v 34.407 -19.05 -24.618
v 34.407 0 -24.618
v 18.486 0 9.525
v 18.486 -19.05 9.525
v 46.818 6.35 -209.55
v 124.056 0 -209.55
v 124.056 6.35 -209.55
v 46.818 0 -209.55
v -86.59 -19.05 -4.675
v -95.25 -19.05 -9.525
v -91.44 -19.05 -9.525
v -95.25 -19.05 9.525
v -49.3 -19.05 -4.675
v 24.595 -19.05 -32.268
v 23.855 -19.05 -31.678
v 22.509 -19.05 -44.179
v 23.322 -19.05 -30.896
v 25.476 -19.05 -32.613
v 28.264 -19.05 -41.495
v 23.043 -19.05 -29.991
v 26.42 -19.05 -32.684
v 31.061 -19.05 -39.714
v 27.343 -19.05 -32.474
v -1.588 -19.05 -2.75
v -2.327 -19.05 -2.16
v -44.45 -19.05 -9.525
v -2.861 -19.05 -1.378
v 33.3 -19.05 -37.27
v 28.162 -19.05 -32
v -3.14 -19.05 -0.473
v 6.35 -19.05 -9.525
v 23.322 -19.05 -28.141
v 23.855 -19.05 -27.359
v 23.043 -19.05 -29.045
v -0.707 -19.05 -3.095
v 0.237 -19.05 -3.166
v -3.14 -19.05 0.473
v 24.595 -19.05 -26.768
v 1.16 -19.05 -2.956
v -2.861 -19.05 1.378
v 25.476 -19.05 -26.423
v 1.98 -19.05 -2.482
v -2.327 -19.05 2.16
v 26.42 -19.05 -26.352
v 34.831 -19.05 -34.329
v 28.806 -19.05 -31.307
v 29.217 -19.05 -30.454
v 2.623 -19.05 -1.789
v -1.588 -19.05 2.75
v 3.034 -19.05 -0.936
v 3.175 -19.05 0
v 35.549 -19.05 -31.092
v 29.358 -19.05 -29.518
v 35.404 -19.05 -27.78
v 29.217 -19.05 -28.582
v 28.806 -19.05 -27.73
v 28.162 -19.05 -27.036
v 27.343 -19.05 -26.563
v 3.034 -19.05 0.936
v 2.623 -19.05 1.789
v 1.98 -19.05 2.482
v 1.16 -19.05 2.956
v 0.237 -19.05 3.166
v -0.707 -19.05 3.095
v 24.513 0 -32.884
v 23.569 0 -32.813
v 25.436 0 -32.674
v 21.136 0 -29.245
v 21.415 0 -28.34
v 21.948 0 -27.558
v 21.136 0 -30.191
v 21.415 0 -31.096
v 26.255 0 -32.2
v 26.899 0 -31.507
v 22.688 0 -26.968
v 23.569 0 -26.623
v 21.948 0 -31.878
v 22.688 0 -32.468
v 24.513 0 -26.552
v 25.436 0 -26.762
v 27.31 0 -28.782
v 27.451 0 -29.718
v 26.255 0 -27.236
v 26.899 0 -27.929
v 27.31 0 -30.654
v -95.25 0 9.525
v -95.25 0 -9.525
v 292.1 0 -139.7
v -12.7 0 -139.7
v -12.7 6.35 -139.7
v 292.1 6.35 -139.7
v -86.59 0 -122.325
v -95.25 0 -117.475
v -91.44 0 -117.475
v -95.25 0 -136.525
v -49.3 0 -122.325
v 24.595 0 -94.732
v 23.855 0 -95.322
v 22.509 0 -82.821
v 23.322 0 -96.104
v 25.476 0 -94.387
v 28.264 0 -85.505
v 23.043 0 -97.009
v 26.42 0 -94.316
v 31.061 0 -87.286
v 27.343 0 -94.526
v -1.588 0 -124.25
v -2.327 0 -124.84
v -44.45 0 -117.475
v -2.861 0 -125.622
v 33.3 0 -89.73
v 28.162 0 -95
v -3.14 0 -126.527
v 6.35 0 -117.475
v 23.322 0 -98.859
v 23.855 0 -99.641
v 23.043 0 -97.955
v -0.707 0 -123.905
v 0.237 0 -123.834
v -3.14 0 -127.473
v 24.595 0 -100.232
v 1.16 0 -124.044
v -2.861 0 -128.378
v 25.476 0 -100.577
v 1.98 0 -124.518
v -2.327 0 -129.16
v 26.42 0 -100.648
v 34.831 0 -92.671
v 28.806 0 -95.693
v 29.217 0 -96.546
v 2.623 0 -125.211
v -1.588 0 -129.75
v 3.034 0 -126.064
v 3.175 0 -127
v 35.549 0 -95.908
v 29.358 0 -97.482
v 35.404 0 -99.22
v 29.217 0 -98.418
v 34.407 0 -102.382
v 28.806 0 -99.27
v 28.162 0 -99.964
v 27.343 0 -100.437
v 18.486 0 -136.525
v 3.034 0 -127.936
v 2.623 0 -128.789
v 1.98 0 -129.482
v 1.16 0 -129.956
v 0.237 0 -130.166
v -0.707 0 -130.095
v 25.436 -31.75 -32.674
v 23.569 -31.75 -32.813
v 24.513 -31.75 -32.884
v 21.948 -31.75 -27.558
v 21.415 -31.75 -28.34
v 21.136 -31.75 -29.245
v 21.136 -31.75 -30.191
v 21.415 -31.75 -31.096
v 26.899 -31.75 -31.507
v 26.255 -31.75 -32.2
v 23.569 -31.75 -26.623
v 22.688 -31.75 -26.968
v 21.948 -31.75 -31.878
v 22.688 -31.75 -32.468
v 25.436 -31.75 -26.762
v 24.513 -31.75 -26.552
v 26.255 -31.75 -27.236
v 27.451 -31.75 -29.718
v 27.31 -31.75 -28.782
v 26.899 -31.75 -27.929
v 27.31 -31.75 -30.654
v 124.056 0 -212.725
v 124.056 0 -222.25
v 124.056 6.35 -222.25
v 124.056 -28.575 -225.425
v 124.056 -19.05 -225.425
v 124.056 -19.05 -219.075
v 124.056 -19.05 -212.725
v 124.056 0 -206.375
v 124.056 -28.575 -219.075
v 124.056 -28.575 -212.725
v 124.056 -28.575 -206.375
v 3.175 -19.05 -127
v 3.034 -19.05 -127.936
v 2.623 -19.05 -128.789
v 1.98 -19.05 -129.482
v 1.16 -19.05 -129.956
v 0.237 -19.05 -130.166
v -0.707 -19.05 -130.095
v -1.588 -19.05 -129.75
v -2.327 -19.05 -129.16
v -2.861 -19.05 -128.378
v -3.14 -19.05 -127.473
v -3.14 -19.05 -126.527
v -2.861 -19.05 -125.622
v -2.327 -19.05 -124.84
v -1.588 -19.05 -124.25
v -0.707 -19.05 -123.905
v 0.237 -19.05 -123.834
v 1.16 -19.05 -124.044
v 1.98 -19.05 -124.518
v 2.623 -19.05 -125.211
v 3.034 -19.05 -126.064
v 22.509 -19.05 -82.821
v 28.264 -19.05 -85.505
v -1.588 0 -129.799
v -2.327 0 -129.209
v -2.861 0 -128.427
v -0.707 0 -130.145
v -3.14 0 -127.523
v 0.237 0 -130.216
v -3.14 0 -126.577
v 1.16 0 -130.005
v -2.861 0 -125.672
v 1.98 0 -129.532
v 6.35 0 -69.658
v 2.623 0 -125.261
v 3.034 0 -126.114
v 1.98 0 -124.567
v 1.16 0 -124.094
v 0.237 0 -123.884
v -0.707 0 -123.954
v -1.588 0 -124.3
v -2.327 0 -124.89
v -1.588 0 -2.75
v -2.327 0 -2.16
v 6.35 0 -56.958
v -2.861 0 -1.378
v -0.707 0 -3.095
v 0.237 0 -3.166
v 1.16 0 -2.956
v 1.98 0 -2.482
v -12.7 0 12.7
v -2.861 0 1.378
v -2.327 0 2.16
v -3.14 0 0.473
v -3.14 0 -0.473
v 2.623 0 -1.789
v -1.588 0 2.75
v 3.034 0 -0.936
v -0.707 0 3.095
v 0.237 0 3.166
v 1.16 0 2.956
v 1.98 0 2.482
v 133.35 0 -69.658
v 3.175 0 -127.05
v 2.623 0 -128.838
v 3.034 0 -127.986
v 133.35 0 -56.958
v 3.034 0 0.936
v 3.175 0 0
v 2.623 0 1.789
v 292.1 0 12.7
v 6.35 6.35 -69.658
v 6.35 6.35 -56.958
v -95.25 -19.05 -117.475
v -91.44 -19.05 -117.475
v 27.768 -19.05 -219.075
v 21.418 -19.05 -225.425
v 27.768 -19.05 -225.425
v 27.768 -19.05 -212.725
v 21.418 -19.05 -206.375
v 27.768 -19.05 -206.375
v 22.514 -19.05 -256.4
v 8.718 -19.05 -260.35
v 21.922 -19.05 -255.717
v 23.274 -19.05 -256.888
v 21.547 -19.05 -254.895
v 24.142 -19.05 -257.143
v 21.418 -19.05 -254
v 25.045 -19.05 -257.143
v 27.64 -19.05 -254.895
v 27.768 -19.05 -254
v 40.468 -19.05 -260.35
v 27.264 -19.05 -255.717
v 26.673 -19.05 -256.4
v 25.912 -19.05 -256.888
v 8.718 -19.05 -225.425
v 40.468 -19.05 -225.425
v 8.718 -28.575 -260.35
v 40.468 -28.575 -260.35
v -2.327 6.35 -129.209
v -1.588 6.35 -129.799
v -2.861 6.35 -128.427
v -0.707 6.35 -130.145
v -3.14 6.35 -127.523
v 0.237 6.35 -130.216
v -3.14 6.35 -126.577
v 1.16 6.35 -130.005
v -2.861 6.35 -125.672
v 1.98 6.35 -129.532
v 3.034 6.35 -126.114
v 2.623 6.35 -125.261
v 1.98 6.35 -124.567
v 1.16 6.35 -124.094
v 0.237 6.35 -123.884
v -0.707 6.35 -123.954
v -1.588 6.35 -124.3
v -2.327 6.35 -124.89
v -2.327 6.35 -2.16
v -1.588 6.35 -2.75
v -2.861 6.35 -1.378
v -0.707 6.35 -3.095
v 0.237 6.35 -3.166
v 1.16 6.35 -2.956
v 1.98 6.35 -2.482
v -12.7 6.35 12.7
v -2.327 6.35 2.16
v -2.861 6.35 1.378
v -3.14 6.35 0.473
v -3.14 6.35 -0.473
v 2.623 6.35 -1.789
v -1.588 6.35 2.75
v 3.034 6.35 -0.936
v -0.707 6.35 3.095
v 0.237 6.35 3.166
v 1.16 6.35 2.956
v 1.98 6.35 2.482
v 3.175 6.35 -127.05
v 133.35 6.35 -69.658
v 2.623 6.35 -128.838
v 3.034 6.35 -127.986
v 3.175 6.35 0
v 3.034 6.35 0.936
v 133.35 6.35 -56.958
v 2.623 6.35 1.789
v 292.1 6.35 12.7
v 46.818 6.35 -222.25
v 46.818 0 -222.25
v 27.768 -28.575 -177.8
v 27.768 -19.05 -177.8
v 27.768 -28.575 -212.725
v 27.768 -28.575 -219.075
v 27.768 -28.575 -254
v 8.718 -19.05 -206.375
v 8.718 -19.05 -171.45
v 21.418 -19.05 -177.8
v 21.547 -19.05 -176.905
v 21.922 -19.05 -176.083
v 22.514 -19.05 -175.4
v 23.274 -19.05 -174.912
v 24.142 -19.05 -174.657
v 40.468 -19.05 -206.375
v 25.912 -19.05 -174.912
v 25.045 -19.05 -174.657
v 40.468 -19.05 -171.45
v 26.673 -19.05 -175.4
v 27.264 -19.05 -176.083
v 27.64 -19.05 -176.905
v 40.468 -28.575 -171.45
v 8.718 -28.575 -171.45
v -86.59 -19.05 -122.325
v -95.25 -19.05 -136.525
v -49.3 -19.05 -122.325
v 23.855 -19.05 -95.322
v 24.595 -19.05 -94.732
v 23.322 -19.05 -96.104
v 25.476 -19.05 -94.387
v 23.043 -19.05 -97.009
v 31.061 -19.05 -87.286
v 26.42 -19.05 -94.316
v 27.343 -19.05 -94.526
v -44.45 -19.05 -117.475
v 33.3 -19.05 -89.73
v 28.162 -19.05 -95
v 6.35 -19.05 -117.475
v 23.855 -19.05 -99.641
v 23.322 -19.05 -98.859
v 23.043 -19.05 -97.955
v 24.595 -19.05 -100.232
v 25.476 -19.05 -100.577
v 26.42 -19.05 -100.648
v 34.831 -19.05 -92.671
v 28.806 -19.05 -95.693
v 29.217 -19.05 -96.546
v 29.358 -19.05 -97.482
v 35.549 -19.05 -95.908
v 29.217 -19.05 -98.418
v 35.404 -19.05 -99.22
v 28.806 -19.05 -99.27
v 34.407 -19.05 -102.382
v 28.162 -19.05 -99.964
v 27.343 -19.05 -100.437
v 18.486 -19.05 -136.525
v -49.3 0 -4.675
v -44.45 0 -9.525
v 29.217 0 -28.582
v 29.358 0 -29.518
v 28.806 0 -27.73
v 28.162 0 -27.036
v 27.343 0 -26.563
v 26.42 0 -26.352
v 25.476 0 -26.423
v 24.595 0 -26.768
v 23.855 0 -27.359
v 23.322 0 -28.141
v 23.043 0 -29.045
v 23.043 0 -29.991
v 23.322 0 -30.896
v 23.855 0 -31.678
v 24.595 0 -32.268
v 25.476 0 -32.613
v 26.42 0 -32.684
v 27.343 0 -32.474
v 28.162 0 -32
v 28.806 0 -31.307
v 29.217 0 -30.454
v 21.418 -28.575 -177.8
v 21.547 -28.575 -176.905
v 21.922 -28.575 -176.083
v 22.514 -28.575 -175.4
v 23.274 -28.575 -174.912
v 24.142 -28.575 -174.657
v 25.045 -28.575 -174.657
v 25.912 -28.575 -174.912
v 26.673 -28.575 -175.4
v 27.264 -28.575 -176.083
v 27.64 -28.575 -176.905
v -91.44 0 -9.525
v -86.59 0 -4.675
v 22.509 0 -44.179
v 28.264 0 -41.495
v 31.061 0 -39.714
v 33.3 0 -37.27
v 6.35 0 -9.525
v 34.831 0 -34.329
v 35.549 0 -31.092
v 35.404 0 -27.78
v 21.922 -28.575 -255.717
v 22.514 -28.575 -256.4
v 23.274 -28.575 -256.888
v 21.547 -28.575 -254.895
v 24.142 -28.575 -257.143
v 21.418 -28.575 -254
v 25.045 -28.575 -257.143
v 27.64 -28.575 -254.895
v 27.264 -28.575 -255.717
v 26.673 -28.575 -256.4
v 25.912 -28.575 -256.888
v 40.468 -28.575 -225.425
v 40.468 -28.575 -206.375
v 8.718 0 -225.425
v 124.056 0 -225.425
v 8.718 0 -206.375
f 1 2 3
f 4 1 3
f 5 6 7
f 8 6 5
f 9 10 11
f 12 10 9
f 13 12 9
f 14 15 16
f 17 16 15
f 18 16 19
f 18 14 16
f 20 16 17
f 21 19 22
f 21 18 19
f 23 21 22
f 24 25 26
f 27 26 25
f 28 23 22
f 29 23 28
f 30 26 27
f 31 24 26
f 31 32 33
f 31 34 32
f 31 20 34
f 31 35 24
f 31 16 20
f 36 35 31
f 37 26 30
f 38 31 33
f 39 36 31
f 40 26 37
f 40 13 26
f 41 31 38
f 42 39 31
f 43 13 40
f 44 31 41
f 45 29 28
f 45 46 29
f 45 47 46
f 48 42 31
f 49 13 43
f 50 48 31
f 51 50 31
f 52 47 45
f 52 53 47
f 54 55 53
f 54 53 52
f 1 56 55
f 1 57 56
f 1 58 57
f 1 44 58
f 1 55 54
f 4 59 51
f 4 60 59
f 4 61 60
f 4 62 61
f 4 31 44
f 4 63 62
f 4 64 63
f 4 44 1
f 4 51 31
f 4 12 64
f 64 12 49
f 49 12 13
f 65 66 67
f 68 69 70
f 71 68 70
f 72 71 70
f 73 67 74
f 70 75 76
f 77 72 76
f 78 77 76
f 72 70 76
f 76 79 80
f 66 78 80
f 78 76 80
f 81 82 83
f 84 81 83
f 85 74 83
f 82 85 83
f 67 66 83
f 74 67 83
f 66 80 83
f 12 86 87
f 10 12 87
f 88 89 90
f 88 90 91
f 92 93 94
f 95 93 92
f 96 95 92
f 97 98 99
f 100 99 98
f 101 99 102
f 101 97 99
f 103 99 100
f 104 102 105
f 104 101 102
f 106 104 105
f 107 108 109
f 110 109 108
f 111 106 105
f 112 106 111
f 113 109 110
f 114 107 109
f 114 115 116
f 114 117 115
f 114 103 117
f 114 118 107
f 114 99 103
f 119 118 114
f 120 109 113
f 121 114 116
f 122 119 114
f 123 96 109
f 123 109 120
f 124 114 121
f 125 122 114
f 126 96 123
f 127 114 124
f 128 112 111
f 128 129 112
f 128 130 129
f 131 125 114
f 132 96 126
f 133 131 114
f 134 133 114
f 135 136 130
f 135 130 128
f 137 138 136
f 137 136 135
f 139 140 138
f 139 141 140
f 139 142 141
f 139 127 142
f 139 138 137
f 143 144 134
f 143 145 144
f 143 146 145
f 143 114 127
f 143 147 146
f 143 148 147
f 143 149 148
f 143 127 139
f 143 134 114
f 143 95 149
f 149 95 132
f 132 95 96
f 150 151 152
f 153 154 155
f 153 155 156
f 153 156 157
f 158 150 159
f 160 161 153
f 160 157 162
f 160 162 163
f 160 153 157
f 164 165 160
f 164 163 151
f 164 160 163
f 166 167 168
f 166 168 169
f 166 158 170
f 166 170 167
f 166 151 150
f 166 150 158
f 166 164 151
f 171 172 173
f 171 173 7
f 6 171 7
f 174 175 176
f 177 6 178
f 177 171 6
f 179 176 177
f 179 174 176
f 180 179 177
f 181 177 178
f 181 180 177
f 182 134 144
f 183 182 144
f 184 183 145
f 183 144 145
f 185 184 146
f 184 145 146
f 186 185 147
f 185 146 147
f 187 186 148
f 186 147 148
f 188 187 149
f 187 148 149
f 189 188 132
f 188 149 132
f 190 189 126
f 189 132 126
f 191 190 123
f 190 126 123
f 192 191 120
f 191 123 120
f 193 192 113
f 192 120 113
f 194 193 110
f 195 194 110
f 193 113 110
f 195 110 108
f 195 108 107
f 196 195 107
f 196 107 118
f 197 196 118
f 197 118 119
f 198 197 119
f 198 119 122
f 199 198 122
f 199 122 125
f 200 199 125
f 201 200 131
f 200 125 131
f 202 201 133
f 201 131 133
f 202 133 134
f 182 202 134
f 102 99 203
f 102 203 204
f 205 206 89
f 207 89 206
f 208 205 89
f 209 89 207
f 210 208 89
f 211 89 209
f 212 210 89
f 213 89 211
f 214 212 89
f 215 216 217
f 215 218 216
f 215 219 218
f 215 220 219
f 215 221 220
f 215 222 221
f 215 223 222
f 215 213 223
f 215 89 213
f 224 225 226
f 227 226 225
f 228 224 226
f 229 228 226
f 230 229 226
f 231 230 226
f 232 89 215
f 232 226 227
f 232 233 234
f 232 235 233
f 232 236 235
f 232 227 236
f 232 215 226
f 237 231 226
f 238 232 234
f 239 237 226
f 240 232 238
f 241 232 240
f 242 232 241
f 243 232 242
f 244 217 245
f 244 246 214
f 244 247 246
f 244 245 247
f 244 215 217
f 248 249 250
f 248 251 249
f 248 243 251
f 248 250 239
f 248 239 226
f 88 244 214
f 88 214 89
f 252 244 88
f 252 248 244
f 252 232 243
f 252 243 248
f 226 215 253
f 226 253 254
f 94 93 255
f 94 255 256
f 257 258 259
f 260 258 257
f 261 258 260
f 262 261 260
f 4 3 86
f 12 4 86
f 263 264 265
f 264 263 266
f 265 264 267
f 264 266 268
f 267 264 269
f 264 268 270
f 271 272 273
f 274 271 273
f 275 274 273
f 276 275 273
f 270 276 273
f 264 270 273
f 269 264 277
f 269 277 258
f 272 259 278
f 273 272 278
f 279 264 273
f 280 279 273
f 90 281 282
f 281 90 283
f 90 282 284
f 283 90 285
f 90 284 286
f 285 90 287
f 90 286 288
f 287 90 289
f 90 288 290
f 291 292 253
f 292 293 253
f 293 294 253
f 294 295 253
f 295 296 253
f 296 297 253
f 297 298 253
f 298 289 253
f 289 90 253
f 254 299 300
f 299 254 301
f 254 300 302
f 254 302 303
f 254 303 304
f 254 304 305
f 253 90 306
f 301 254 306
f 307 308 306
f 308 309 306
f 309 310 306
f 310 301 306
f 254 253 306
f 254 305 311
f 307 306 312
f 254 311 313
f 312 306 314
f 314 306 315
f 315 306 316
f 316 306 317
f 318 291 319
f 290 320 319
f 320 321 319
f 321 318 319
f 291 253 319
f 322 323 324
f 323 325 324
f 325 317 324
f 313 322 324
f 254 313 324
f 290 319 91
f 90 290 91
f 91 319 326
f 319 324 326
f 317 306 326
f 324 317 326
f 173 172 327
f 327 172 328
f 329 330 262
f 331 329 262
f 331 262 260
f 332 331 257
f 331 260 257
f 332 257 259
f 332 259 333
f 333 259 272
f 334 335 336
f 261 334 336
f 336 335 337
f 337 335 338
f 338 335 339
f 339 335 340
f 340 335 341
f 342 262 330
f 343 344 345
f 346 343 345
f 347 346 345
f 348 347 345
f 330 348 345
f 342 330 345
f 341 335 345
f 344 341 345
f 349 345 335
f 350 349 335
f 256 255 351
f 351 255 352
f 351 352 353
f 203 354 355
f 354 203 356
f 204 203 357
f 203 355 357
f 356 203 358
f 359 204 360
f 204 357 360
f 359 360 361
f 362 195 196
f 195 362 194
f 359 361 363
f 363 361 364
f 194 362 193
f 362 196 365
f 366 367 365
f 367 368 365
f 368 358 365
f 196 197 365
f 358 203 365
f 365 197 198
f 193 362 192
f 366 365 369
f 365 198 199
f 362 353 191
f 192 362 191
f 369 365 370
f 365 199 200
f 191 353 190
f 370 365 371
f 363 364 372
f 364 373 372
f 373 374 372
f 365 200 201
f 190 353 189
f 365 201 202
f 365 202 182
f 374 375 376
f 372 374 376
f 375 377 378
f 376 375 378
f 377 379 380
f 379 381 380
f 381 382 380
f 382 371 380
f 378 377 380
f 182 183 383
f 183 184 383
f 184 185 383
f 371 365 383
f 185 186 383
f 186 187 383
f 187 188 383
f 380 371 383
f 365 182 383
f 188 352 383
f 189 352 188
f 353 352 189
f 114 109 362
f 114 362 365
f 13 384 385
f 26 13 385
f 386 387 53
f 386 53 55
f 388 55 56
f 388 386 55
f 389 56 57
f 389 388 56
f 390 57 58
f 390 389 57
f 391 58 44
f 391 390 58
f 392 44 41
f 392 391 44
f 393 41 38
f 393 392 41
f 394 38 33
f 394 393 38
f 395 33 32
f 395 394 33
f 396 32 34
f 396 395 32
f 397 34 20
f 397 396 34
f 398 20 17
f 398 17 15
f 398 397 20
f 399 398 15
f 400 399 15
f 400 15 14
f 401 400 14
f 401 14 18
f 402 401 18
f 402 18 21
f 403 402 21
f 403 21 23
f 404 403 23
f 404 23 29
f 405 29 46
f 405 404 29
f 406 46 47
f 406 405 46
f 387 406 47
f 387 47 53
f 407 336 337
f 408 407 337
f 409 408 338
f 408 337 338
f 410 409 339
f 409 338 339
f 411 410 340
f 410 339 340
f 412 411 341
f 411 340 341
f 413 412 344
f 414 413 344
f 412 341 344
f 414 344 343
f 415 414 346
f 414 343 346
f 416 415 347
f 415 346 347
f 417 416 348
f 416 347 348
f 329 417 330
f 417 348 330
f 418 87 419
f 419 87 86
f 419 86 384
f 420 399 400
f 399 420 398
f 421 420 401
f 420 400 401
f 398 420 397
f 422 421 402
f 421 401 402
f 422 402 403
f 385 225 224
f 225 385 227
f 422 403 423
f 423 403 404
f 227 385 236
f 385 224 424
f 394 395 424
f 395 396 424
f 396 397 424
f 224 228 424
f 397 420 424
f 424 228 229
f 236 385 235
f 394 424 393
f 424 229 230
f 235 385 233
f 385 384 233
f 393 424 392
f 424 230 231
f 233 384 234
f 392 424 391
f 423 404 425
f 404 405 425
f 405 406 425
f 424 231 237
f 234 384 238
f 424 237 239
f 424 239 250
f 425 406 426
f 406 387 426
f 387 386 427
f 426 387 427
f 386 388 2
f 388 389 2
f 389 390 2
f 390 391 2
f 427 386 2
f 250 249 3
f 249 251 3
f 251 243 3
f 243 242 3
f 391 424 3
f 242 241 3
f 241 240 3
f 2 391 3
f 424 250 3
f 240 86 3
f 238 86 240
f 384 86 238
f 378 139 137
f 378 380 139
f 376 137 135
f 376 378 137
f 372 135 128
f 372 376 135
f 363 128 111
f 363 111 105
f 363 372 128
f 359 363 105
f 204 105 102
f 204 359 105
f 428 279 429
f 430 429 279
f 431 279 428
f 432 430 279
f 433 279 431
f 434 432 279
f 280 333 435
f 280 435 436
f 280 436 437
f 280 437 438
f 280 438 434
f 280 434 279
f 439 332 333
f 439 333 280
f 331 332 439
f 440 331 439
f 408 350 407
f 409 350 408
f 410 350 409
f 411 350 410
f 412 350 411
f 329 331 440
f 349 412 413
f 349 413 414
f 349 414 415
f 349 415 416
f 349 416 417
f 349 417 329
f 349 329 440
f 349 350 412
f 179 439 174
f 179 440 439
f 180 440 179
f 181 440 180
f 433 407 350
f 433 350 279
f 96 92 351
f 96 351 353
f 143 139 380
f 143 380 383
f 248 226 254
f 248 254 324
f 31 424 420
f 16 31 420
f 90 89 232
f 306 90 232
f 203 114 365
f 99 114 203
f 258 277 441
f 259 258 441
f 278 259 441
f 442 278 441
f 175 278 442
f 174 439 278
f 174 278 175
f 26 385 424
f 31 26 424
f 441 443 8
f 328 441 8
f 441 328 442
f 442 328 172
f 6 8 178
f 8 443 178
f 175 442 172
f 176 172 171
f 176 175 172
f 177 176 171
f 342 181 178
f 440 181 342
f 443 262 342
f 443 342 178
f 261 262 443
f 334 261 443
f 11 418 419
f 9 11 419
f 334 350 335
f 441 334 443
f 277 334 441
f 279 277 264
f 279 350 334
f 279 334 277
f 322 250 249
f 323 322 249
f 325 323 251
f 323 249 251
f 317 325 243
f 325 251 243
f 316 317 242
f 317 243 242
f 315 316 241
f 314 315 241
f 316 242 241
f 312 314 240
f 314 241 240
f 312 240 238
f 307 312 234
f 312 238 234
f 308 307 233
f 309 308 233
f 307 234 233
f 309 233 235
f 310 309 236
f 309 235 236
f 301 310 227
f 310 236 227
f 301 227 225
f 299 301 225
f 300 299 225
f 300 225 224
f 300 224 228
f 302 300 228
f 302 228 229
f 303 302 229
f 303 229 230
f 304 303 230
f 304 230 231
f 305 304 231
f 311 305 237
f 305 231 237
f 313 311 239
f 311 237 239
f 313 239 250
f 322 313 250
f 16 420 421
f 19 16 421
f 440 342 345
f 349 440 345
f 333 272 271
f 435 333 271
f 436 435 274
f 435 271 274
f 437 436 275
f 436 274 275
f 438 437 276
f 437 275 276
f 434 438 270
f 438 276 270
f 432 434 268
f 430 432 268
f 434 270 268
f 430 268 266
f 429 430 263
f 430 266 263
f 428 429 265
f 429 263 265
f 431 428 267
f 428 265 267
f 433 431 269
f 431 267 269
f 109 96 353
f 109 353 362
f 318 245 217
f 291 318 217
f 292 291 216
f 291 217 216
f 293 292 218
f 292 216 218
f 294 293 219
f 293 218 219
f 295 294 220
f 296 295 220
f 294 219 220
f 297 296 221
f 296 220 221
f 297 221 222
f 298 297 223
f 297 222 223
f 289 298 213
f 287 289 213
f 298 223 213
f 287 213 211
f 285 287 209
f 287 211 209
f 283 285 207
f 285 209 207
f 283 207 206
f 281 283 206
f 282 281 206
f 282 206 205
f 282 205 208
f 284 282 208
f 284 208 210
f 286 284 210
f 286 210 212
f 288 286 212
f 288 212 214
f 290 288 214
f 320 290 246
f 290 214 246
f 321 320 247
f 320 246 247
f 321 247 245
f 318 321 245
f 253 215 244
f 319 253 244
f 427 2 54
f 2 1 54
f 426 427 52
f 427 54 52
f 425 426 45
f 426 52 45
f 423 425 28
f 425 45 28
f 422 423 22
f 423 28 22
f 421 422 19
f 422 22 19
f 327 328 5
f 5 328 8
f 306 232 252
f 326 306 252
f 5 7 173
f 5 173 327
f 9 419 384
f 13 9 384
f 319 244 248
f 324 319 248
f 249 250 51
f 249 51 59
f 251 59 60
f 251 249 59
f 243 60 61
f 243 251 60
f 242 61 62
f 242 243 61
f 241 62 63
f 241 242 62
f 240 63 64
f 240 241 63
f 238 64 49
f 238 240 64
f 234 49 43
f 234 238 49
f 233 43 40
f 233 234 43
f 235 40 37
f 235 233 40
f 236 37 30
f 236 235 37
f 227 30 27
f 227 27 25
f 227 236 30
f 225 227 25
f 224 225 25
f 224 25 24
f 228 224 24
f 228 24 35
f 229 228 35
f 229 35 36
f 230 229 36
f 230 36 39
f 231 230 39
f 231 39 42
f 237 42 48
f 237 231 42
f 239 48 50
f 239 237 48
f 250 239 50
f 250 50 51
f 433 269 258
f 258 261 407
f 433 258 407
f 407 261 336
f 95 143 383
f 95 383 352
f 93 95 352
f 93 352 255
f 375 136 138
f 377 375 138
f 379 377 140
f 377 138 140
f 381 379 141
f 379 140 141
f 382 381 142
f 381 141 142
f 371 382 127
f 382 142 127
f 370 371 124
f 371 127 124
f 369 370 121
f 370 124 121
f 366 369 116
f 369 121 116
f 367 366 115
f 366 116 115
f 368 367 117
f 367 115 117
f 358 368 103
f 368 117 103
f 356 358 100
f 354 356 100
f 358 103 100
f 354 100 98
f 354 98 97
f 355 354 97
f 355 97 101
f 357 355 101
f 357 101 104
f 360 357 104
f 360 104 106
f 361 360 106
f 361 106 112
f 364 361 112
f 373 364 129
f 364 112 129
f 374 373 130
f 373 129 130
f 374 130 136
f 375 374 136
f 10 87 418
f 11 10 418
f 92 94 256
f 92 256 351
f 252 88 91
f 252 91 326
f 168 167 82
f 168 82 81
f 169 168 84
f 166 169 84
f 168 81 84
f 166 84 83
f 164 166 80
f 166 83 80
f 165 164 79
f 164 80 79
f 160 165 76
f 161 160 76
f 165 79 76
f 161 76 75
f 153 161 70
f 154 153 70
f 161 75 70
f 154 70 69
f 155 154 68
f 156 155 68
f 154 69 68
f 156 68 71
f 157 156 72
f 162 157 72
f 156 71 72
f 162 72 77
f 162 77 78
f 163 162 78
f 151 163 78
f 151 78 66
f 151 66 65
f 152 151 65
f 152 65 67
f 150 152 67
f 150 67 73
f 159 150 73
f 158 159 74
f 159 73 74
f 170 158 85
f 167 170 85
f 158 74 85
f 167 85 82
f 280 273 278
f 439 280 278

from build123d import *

# Parameters (mm, degrees)
F0_R      = 3.175
F1_DEPTH  = 19.05
F5_W      = 304.8
F5_H      = 152.4
F5_R      = 3.175
F5_W_2    = 127
F5_H_2    = 12.7
F6_DEPTH  = 6.35
F8_R      = 12.7
F8_2_R    = 12.7
F9_R      = 3.175
F10_DEPTH = 31.75
F11_W     = 12.7
F11_H     = 6.35
F11_W_2   = 96.2871945223
F12_DEPTH = 9.525
F11_W_3   = 6.35
F13_DEPTH = 19.05
F14_W     = 77.2371945223
F14_H     = 12.7
F15_DEPTH = 6.35


with BuildPart() as f1:
    # F0 (on Front) → F1 (new body)
    with BuildSketch(Plane.XZ):
        Polygon((18.4861884684, 9.525), (-95.25, 9.525), (-95.25, -9.525), (-91.44, -9.525), (-86.5903822696, -4.6753822696), (-49.2996177304, -4.6753822696), (-44.45, -9.525), (6.35, -9.525), (22.5093851571, -44.1789133007), (39.7745485002, -36.1280354145), align=None)
        with Locations((26.1826050089, -29.5180886138)):
            Circle(F0_R, mode=Mode.SUBTRACT)
        Circle(F0_R, mode=Mode.SUBTRACT)
    extrude(amount=F1_DEPTH)


with BuildPart() as f4_1:
    # F4: instance of F1
    add(f1.part.mirror(Plane.XY.offset(-63.5)))

    # F8#2
    f8_2_edges = [f4_1.edges().sort_by_distance(p)[0] for p in [
        (39.774549, -9.525, -90.871965),
    ]]
    fillet(f8_2_edges, radius=F8_2_R)


with BuildPart() as f6:
    # F5 (on Front) → F6 (new body)
    with BuildSketch(Plane.XZ):
        with Locations((139.7, -63.5)):
            Rectangle(F5_W, F5_H)
        with Locations((0, -127.0497590303)):
            Circle(F5_R, mode=Mode.SUBTRACT)
        with Locations((69.85, -63.3081676602)):
            Rectangle(F5_W_2, F5_H_2, mode=Mode.SUBTRACT)
        Circle(F5_R, mode=Mode.SUBTRACT)
    extrude(amount=-F6_DEPTH)


with BuildPart() as f1_1:
    add(f1.part)

    # F8
    f8_edges = [f1_1.edges().sort_by_distance(p)[0] for p in [
        (39.774549, -9.525, -36.128035),
    ]]
    fillet(f8_edges, radius=F8_R)


with BuildPart() as f10:
    # F9 (on face) → F10 (new body)
    with BuildSketch(Plane.XZ):
        with Locations((24.2757443339, -29.718)):
            Circle(F9_R)
    extrude(amount=F10_DEPTH)


with BuildPart() as f12:
    # F11 (on offset) → F12 (new body)
    with BuildSketch(Plane.XZ.offset(19.05)):
        with BuildLine():
            Line((21.4183922329, -225.425), (8.7183922329, -225.425))
            Line((8.7183922329, -225.425), (8.7183922329, -260.35))
            Line((8.7183922329, -260.35), (40.4683922329, -260.35))
            Line((40.4683922329, -260.35), (40.4683922329, -225.425))
            Line((40.4683922329, -225.425), (27.7683922329, -225.425))
            Line((27.7683922329, -225.425), (27.7683922329, -254))
            ThreePointArc((27.7683922329, -254), (24.5933922329, -257.175), (21.4183922329, -254))
            Line((21.4183922329, -254), (21.4183922329, -225.425))
        make_face()
        with BuildLine():
            Line((40.4683922329, -171.45), (8.7183922329, -171.45))
            Line((8.7183922329, -171.45), (8.7183922329, -206.375))
            Line((8.7183922329, -206.375), (21.4183922329, -206.375))
            Line((21.4183922329, -206.375), (21.4183922329, -177.8))
            ThreePointArc((21.4183922329, -177.8), (24.5933922329, -174.625), (27.7683922329, -177.8))
            Line((27.7683922329, -177.8), (27.7683922329, -206.375))
            Line((27.7683922329, -206.375), (40.4683922329, -206.375))
            Line((40.4683922329, -206.375), (40.4683922329, -171.45))
        make_face()
        Polygon((124.0555867553, -206.375), (40.4683922329, -206.375), (27.7683922329, -206.375), (27.7683922329, -212.725), (124.0555867553, -212.725), align=None)
        with Locations((15.0683922329, -209.55)):
            Rectangle(F11_W, F11_H)
        with Locations((15.0683922329, -222.25)):
            Rectangle(F11_W, F11_H)
        Polygon((124.0555867553, -225.425), (124.0555867553, -219.075), (27.7683922329, -219.075), (27.7683922329, -225.425), (40.4683922329, -225.425), align=None)
        with Locations((75.9119894941, -215.9)):
            Rectangle(F11_W_2, F11_H)
        with Locations((15.0683922329, -215.9)):
            Rectangle(F11_W, F11_H)
    extrude(amount=F12_DEPTH)

    # F11 (on offset) → F13 (join)
    with BuildSketch(Plane.XZ.offset(19.05)):
        Polygon((124.0555867553, -225.425), (124.0555867553, -219.075), (27.7683922329, -219.075), (27.7683922329, -225.425), (40.4683922329, -225.425), align=None)
        with Locations((75.9119894941, -215.9)):
            Rectangle(F11_W_2, F11_H)
        Polygon((124.0555867553, -206.375), (40.4683922329, -206.375), (27.7683922329, -206.375), (27.7683922329, -212.725), (124.0555867553, -212.725), align=None)
        with Locations((15.0683922329, -209.55)):
            Rectangle(F11_W, F11_H)
        with Locations((15.0683922329, -222.25)):
            Rectangle(F11_W, F11_H)
        with Locations((15.0683922329, -215.9)):
            Rectangle(F11_W, F11_H)
        with Locations((24.5933922329, -215.9)):
            Rectangle(F11_W_3, F11_H)
        with Locations((24.5933922329, -209.55)):
            Rectangle(F11_W_3, F11_H)
        with Locations((24.5933922329, -222.25)):
            Rectangle(F11_W_3, F11_H)
    extrude(amount=-F13_DEPTH)

    # F14 (on face) → F15 (join)
    with BuildSketch(Plane(origin=(0, 0, 0), x_dir=(-1, 0, 0), z_dir=(0, 1, 0))):
        with Locations((-85.4369894941, -215.9)):
            Rectangle(F14_W, F14_H)
    extrude(amount=F15_DEPTH)


solid = Compound([f4_1.part, f6.part, f1_1.part, f10.part, f12.part])
